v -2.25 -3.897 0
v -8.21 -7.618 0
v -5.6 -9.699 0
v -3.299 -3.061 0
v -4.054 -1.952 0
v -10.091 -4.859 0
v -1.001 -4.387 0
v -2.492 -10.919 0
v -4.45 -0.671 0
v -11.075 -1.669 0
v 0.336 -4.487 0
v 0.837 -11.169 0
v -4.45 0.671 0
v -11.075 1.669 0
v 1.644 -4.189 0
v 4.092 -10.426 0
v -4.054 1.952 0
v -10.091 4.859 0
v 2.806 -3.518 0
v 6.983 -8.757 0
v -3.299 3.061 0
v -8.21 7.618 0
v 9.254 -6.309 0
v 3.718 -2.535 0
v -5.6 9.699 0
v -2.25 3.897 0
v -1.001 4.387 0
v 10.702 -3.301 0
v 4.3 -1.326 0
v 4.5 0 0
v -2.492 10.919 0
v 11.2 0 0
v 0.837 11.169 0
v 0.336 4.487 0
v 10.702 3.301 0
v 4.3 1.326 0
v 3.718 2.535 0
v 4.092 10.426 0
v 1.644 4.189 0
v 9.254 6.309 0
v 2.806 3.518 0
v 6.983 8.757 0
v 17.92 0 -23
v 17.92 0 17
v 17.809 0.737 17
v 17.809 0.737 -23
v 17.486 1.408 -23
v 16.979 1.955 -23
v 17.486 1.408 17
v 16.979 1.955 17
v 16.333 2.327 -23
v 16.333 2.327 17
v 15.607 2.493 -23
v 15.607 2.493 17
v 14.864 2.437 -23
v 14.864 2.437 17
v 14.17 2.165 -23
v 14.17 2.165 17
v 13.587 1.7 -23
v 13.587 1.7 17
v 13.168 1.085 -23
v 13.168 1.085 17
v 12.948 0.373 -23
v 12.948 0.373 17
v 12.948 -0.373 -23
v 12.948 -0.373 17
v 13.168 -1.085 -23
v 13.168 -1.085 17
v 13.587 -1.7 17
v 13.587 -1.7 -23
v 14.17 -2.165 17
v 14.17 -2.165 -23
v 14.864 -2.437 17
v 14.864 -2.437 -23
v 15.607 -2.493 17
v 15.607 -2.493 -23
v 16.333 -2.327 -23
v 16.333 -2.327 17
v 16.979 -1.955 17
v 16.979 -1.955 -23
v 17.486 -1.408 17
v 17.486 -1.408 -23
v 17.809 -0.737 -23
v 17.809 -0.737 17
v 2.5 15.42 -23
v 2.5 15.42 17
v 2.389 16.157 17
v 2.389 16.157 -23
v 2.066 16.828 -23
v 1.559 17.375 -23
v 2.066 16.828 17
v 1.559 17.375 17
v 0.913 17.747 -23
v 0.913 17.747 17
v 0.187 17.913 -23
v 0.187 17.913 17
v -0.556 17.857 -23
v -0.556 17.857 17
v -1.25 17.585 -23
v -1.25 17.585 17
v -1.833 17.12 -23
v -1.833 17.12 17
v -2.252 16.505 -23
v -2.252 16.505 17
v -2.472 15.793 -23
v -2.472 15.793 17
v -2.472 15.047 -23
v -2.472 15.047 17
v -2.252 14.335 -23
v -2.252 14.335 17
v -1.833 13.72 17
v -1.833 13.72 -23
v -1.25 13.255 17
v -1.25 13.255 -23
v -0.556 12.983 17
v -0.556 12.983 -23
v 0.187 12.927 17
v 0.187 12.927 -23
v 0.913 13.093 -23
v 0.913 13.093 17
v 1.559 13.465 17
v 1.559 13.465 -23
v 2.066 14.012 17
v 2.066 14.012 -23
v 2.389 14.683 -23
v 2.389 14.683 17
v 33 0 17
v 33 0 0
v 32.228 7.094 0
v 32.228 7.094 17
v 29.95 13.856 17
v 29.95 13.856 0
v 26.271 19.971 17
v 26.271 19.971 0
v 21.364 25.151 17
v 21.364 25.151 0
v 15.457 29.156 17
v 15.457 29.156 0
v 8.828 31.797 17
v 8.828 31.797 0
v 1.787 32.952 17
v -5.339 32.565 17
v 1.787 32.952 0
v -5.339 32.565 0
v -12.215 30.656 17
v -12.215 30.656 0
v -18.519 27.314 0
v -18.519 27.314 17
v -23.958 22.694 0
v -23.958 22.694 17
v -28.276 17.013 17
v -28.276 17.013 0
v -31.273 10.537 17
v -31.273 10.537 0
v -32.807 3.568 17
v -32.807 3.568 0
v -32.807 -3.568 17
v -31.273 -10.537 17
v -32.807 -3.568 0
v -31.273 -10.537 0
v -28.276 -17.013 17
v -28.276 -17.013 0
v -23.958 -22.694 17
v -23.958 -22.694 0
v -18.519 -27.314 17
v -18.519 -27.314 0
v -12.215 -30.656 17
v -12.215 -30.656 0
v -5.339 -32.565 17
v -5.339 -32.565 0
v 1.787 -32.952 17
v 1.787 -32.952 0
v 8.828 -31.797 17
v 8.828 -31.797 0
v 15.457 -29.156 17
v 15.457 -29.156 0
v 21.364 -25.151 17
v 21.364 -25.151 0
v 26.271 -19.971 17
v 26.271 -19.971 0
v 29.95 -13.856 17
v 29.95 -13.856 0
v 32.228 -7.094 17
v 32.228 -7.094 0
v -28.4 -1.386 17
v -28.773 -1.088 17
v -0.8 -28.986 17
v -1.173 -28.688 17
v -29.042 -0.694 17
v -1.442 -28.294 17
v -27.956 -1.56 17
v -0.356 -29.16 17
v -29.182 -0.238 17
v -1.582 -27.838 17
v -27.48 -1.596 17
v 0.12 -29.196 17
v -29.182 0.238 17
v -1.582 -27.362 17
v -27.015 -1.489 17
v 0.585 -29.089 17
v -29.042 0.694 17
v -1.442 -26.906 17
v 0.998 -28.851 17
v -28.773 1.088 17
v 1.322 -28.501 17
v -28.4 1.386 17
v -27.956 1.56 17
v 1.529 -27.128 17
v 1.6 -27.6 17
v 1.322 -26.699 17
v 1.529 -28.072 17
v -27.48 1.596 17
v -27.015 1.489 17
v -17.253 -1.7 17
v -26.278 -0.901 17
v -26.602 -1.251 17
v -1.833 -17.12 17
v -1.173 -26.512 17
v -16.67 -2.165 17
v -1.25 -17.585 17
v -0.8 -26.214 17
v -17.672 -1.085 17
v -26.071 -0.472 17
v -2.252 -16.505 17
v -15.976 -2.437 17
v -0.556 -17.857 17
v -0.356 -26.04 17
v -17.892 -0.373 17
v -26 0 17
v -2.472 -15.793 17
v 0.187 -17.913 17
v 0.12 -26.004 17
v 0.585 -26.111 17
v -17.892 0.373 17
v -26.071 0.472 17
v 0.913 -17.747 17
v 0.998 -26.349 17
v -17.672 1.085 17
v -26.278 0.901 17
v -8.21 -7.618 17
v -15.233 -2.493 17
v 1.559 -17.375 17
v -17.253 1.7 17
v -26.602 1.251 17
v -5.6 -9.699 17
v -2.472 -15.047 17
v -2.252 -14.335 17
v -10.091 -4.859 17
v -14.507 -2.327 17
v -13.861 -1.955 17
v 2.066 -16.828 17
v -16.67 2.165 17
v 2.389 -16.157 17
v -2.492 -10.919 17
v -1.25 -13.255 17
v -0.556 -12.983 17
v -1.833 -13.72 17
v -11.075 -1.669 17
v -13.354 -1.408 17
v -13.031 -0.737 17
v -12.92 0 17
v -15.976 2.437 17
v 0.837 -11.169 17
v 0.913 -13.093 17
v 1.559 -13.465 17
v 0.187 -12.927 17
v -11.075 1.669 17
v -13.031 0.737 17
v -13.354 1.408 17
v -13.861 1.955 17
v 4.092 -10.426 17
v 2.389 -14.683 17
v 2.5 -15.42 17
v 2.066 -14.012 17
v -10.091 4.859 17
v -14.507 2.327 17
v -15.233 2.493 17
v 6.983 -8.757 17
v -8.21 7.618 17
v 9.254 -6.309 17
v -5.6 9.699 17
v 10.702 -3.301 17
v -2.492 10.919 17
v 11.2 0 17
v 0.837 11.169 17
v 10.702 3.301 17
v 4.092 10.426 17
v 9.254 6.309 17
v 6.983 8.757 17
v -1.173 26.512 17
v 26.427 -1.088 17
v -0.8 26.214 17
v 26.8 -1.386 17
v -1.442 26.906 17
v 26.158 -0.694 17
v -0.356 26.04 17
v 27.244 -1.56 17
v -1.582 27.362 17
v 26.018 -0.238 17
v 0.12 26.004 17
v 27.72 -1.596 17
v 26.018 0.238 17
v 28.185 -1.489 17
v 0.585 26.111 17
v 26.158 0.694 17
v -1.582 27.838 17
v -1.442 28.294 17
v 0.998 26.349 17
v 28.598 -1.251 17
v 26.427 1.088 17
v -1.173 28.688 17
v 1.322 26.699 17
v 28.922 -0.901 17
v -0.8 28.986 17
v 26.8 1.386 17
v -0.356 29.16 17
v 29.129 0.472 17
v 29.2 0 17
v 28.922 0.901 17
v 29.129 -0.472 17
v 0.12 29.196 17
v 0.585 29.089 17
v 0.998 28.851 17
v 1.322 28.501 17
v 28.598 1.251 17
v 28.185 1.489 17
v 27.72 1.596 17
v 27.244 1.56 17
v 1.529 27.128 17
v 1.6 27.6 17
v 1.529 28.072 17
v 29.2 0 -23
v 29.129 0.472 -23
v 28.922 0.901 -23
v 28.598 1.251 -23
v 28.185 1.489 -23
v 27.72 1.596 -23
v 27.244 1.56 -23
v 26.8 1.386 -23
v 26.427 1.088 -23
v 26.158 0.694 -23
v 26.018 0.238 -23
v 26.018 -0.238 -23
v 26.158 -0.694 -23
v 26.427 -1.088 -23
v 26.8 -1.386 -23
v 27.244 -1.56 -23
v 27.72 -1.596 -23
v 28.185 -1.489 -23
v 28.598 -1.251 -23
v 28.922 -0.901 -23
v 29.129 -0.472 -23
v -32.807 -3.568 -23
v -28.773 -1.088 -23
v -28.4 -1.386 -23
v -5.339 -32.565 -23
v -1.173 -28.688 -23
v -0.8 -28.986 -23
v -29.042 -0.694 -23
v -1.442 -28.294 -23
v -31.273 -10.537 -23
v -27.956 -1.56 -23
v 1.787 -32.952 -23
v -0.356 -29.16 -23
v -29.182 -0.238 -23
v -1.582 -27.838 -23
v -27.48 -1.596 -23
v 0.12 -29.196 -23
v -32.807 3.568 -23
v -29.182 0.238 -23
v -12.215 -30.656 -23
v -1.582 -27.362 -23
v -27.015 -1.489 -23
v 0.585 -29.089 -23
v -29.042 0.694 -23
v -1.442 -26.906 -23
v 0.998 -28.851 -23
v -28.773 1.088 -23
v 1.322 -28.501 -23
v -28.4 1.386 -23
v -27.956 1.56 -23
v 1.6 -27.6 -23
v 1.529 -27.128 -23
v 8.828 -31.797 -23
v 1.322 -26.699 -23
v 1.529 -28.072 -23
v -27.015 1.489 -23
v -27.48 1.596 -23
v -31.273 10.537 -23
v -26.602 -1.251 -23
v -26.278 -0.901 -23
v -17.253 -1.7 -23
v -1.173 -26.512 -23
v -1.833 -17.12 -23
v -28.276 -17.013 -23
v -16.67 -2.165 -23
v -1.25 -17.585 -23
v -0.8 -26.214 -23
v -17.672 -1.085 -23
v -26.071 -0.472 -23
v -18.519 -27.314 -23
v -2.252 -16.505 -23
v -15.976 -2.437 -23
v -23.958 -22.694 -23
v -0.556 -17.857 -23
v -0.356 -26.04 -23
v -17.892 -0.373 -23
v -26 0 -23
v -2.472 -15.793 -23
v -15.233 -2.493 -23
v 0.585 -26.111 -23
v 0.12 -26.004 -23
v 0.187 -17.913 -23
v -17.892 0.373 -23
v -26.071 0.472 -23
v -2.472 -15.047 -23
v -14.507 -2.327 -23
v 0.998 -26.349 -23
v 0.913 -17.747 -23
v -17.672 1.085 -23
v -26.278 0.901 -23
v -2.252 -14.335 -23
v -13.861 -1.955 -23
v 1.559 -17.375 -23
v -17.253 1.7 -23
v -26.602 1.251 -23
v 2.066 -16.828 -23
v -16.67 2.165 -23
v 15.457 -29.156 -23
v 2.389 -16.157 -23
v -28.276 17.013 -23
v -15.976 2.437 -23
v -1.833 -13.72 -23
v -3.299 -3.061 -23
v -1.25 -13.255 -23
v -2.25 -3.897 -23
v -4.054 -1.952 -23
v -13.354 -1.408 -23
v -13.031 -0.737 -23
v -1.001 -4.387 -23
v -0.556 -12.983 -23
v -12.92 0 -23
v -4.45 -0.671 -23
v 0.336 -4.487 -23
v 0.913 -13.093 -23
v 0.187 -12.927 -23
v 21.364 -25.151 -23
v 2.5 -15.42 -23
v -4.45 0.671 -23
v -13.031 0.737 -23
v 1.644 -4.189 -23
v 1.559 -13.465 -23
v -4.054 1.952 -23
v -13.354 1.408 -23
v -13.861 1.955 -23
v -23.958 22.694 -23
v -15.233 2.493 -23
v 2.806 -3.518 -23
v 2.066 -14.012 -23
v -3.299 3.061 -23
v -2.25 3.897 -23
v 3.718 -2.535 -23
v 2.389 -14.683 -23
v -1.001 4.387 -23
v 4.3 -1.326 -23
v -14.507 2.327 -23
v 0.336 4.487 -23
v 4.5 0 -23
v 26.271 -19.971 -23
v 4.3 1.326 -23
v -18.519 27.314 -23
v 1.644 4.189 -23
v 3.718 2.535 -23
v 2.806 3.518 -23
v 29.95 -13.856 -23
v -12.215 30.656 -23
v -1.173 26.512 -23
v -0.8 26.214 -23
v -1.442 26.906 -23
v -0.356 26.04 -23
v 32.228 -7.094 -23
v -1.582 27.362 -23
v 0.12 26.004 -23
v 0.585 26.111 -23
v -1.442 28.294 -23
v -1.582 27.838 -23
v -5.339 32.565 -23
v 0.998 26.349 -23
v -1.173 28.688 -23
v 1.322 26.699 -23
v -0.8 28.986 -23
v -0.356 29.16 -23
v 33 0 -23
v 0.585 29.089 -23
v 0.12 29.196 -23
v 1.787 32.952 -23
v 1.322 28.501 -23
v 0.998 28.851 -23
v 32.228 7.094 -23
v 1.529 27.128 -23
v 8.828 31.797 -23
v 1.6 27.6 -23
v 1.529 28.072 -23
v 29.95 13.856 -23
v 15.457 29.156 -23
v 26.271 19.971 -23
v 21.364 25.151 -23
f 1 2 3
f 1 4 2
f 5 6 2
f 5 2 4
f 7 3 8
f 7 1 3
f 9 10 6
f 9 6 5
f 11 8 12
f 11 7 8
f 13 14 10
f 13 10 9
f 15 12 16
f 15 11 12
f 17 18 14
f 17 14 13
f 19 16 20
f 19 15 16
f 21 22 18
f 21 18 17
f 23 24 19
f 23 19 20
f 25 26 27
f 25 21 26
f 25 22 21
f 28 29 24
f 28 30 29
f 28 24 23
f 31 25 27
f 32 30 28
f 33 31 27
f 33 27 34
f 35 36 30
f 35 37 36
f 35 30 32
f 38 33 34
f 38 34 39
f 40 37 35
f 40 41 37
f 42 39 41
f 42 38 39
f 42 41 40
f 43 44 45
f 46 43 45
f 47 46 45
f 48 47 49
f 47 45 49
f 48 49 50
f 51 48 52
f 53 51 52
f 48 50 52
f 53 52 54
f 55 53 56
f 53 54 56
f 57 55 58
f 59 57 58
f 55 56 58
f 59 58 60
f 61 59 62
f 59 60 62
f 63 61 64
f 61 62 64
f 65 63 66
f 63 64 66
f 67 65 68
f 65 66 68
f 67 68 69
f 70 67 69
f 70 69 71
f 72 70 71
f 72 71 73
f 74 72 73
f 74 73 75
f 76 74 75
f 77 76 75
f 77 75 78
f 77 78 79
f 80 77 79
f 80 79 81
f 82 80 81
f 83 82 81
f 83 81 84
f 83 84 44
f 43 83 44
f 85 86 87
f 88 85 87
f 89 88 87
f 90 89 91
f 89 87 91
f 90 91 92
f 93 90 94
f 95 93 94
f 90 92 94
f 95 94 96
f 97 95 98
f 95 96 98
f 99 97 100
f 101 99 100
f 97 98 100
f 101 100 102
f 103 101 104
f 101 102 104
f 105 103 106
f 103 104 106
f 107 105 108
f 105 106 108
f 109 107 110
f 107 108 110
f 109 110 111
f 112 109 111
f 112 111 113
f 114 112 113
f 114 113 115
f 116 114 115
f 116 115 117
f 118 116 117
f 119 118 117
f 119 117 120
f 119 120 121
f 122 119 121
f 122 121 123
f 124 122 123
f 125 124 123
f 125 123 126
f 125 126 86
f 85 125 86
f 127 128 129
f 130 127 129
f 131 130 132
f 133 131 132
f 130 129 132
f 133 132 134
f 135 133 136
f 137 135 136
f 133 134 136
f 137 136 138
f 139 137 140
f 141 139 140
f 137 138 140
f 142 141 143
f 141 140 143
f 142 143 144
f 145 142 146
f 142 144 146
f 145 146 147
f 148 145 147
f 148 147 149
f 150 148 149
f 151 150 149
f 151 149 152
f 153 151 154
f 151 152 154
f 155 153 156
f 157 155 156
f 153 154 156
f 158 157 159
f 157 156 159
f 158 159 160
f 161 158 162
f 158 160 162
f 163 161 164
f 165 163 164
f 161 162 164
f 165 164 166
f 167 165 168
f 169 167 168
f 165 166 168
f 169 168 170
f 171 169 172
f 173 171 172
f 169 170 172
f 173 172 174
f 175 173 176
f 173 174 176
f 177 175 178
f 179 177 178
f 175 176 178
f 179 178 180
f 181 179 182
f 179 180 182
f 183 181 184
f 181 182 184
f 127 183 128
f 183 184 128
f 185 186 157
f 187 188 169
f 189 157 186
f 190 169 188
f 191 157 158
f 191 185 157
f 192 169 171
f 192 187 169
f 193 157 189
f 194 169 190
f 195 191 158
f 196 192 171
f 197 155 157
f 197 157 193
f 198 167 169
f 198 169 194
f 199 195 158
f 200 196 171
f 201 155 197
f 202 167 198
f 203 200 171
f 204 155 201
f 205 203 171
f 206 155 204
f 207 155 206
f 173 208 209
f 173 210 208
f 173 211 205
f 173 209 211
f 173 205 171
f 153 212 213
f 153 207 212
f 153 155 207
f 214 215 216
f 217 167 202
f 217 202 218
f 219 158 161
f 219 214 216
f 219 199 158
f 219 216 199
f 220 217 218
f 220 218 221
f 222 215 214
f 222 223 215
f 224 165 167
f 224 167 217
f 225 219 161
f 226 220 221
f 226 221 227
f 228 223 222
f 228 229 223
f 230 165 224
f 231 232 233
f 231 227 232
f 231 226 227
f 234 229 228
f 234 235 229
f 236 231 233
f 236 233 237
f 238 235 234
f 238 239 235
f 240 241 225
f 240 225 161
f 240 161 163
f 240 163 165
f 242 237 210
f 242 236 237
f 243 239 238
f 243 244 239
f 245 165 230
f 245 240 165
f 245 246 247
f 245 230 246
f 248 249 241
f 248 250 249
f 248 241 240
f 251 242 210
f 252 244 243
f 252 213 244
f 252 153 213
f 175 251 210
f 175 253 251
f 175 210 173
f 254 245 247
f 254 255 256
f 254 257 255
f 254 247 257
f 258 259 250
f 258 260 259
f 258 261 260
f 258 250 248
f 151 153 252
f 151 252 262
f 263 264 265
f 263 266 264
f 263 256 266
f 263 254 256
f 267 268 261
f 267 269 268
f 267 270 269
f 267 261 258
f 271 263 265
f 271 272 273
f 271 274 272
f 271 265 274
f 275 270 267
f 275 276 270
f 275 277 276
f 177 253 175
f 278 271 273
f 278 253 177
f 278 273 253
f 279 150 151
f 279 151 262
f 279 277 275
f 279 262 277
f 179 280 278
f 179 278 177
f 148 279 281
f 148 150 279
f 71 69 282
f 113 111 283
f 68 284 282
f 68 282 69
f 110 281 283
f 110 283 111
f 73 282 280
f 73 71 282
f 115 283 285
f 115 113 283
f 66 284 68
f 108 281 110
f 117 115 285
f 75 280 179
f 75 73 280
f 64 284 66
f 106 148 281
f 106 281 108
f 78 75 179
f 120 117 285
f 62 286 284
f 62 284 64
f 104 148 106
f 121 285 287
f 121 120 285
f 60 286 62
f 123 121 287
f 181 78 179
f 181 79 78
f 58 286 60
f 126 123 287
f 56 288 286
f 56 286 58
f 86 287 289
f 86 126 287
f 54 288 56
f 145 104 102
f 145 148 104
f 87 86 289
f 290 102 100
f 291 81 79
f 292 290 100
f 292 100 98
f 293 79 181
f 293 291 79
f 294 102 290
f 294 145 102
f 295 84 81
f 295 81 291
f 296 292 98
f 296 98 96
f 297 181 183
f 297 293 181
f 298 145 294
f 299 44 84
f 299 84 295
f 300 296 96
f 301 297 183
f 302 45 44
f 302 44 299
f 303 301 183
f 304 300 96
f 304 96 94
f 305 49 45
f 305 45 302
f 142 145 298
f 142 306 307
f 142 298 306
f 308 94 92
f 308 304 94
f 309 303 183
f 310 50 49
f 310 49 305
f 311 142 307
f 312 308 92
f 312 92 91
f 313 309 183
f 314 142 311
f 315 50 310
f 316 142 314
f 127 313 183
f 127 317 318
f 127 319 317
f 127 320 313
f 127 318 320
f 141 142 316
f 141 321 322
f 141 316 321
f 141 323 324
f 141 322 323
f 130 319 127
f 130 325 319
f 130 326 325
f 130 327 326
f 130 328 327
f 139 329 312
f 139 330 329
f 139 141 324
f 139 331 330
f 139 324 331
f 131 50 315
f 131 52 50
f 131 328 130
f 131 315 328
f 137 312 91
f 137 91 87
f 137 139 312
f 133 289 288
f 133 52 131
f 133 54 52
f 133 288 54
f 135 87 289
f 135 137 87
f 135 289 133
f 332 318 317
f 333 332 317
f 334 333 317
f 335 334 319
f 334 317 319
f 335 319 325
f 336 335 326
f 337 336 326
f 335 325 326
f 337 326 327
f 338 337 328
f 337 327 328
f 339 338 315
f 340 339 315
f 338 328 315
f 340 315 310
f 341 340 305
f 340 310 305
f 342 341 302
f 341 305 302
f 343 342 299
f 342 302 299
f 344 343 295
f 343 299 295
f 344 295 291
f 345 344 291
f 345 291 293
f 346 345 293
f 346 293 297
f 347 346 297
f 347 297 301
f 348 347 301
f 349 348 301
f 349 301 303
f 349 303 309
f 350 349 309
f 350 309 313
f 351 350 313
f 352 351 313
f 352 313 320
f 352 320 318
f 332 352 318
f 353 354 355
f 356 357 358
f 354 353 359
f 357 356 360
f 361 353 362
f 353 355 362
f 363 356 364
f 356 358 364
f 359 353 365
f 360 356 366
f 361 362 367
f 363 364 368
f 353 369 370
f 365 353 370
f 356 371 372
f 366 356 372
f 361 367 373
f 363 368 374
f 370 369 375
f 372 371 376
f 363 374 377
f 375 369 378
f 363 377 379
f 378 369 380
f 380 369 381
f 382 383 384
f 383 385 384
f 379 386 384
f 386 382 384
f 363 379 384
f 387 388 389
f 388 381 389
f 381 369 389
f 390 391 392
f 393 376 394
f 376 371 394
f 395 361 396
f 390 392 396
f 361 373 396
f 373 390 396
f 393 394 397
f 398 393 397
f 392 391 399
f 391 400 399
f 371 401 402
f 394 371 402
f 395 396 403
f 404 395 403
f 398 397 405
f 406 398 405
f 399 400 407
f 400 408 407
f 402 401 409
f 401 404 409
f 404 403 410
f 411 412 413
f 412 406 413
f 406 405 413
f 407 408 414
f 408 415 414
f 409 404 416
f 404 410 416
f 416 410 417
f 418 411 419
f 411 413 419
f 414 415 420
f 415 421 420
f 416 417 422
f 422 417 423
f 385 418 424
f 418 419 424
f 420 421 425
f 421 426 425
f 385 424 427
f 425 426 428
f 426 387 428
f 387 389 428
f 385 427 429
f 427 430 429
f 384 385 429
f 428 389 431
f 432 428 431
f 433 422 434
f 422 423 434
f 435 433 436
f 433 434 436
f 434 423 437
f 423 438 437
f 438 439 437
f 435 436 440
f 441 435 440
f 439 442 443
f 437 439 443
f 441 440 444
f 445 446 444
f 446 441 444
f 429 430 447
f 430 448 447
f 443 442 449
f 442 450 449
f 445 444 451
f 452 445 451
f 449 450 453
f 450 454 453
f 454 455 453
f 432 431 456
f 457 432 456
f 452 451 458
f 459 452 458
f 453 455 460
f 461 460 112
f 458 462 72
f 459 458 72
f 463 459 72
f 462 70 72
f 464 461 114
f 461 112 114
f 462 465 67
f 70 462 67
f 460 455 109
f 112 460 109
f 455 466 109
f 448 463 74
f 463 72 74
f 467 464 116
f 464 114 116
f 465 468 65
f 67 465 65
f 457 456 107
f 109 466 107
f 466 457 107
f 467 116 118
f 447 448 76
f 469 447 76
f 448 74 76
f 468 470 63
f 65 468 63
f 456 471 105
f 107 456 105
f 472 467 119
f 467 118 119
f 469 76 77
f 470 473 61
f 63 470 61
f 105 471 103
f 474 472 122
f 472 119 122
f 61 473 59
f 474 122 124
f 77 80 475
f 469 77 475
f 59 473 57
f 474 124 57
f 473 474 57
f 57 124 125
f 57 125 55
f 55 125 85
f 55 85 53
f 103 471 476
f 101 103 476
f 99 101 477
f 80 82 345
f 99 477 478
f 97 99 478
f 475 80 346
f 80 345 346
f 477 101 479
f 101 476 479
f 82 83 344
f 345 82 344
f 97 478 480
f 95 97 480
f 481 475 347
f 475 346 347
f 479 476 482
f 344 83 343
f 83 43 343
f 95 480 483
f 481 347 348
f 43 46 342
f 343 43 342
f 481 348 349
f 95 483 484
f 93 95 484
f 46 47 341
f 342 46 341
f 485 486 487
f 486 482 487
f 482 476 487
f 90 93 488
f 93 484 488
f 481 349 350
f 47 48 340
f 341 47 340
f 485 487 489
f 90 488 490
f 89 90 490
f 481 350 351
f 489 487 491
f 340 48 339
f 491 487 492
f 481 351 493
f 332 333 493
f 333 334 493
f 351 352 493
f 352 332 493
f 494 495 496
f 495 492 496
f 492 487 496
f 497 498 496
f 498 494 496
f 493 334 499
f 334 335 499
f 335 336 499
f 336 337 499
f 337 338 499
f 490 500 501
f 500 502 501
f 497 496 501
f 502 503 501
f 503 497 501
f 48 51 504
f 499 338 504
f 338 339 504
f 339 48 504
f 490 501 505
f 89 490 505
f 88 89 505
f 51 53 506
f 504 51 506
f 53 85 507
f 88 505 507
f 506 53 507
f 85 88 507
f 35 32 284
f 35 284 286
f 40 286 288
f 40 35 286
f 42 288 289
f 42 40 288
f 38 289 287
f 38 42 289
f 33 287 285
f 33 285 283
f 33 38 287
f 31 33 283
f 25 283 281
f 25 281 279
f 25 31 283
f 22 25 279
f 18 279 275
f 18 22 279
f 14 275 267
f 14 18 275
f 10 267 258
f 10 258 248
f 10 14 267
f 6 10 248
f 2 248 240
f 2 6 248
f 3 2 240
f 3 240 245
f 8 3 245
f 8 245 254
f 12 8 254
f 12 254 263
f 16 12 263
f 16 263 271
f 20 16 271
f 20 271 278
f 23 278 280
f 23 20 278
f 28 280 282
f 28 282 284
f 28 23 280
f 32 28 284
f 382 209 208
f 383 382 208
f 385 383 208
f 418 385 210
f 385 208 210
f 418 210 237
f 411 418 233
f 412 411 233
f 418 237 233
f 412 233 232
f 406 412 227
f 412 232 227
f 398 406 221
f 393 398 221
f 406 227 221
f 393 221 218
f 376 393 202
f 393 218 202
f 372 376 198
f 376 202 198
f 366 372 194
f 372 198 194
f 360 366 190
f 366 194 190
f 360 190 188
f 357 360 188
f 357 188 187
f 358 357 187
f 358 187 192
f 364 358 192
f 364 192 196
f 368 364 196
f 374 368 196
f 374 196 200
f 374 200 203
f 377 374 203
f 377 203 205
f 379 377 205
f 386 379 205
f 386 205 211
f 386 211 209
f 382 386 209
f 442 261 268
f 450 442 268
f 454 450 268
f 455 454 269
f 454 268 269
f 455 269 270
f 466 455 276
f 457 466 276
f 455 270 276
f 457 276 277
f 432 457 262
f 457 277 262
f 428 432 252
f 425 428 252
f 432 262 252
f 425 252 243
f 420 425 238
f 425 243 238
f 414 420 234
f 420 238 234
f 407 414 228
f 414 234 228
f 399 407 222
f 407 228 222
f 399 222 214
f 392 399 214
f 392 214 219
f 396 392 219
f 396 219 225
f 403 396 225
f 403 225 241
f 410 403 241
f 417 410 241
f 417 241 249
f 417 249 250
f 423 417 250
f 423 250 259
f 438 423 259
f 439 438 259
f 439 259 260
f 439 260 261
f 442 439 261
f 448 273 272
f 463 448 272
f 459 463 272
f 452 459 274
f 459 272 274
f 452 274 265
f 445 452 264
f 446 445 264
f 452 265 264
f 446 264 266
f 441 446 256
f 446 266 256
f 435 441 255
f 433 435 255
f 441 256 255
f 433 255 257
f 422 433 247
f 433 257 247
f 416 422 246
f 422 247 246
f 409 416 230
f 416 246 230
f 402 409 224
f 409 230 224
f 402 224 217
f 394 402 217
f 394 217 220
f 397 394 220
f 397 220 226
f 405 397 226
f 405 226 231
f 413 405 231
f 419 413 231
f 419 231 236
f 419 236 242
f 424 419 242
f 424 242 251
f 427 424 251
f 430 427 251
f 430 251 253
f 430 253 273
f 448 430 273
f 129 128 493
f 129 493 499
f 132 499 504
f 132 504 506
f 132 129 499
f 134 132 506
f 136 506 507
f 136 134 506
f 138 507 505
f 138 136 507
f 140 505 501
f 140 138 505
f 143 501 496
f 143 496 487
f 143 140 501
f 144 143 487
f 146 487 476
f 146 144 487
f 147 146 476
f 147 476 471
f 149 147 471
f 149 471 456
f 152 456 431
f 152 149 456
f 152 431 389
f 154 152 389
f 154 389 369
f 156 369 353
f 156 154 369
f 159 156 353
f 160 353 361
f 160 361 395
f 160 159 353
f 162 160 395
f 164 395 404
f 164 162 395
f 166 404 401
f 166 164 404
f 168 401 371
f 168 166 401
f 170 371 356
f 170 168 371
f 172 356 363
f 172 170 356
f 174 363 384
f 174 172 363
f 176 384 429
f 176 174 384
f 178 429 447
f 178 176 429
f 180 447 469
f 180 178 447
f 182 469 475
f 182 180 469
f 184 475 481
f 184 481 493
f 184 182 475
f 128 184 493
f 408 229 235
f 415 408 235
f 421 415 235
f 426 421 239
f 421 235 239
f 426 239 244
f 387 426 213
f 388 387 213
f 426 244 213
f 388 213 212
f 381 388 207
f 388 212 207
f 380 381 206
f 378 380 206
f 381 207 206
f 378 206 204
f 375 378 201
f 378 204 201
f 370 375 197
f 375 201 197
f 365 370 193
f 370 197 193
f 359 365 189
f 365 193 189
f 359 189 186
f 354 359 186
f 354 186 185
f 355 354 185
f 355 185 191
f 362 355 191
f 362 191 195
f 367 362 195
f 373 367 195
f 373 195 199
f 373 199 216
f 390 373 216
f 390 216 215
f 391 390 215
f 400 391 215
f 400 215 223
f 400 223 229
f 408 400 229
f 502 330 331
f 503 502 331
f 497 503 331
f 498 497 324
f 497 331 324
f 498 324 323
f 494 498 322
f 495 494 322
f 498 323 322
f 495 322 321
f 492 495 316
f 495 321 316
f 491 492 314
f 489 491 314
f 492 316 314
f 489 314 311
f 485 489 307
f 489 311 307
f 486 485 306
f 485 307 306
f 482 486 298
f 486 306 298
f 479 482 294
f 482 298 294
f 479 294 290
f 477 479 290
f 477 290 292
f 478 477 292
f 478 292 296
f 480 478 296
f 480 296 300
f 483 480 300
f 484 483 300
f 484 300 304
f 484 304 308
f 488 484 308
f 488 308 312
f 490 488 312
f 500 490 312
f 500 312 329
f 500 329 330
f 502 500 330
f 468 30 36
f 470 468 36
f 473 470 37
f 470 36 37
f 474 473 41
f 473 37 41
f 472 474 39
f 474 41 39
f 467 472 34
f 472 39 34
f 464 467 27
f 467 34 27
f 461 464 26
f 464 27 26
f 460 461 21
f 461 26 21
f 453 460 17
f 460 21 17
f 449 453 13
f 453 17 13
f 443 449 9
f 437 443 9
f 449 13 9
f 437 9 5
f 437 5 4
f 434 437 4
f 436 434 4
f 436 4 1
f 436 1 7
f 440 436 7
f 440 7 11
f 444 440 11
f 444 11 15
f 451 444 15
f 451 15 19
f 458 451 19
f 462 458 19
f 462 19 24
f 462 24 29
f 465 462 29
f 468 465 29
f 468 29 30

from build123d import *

# Parameters (mm, degrees)
F0_R     = 33
F0_R_2   = 11.2
F1_DEPTH = 23
F2_R     = 4.5
F3_DEPTH = 23.001
F4_DEPTH = 17
F5_R     = 2.5
F5_R_2   = 1.6
F6_DEPTH = 40.001


with BuildPart() as f1:
    # F0 (on Top) → F1 (new body)
    with BuildSketch(Plane.XY):
        Circle(F0_R)
        Circle(F0_R_2, mode=Mode.SUBTRACT)
        Circle(F0_R_2)
    extrude(amount=-F1_DEPTH)

    # F2 (on face) → F3 (cut, through all)
    with BuildSketch(Plane.XY):
        Circle(F2_R)
    extrude(amount=-F3_DEPTH, mode=Mode.SUBTRACT)

    # F0 (on Top) → F4 (join)
    with BuildSketch(Plane.XY):
        Circle(F0_R)
        Circle(F0_R_2, mode=Mode.SUBTRACT)
    extrude(amount=F4_DEPTH)

    # F5 (on face) → F6 (cut, through all)
    with BuildSketch(Plane.XY.offset(17)):
        with Locations((15.42, 0)):
            Circle(F5_R)
        with Locations((0, -15.42)):
            Circle(F5_R)
        with Locations((0, 15.42)):
            Circle(F5_R)
        with Locations((-15.42, 0)):
            Circle(F5_R)
        with Locations((27.6, 0)):
            Circle(F5_R_2)
        with Locations((0, 27.6)):
            Circle(F5_R_2)
        with Locations((0, -27.6)):
            Circle(F5_R_2)
        with Locations((-27.6, 0)):
            Circle(F5_R_2)
    extrude(amount=-F6_DEPTH, mode=Mode.SUBTRACT)


solid = f1.part
